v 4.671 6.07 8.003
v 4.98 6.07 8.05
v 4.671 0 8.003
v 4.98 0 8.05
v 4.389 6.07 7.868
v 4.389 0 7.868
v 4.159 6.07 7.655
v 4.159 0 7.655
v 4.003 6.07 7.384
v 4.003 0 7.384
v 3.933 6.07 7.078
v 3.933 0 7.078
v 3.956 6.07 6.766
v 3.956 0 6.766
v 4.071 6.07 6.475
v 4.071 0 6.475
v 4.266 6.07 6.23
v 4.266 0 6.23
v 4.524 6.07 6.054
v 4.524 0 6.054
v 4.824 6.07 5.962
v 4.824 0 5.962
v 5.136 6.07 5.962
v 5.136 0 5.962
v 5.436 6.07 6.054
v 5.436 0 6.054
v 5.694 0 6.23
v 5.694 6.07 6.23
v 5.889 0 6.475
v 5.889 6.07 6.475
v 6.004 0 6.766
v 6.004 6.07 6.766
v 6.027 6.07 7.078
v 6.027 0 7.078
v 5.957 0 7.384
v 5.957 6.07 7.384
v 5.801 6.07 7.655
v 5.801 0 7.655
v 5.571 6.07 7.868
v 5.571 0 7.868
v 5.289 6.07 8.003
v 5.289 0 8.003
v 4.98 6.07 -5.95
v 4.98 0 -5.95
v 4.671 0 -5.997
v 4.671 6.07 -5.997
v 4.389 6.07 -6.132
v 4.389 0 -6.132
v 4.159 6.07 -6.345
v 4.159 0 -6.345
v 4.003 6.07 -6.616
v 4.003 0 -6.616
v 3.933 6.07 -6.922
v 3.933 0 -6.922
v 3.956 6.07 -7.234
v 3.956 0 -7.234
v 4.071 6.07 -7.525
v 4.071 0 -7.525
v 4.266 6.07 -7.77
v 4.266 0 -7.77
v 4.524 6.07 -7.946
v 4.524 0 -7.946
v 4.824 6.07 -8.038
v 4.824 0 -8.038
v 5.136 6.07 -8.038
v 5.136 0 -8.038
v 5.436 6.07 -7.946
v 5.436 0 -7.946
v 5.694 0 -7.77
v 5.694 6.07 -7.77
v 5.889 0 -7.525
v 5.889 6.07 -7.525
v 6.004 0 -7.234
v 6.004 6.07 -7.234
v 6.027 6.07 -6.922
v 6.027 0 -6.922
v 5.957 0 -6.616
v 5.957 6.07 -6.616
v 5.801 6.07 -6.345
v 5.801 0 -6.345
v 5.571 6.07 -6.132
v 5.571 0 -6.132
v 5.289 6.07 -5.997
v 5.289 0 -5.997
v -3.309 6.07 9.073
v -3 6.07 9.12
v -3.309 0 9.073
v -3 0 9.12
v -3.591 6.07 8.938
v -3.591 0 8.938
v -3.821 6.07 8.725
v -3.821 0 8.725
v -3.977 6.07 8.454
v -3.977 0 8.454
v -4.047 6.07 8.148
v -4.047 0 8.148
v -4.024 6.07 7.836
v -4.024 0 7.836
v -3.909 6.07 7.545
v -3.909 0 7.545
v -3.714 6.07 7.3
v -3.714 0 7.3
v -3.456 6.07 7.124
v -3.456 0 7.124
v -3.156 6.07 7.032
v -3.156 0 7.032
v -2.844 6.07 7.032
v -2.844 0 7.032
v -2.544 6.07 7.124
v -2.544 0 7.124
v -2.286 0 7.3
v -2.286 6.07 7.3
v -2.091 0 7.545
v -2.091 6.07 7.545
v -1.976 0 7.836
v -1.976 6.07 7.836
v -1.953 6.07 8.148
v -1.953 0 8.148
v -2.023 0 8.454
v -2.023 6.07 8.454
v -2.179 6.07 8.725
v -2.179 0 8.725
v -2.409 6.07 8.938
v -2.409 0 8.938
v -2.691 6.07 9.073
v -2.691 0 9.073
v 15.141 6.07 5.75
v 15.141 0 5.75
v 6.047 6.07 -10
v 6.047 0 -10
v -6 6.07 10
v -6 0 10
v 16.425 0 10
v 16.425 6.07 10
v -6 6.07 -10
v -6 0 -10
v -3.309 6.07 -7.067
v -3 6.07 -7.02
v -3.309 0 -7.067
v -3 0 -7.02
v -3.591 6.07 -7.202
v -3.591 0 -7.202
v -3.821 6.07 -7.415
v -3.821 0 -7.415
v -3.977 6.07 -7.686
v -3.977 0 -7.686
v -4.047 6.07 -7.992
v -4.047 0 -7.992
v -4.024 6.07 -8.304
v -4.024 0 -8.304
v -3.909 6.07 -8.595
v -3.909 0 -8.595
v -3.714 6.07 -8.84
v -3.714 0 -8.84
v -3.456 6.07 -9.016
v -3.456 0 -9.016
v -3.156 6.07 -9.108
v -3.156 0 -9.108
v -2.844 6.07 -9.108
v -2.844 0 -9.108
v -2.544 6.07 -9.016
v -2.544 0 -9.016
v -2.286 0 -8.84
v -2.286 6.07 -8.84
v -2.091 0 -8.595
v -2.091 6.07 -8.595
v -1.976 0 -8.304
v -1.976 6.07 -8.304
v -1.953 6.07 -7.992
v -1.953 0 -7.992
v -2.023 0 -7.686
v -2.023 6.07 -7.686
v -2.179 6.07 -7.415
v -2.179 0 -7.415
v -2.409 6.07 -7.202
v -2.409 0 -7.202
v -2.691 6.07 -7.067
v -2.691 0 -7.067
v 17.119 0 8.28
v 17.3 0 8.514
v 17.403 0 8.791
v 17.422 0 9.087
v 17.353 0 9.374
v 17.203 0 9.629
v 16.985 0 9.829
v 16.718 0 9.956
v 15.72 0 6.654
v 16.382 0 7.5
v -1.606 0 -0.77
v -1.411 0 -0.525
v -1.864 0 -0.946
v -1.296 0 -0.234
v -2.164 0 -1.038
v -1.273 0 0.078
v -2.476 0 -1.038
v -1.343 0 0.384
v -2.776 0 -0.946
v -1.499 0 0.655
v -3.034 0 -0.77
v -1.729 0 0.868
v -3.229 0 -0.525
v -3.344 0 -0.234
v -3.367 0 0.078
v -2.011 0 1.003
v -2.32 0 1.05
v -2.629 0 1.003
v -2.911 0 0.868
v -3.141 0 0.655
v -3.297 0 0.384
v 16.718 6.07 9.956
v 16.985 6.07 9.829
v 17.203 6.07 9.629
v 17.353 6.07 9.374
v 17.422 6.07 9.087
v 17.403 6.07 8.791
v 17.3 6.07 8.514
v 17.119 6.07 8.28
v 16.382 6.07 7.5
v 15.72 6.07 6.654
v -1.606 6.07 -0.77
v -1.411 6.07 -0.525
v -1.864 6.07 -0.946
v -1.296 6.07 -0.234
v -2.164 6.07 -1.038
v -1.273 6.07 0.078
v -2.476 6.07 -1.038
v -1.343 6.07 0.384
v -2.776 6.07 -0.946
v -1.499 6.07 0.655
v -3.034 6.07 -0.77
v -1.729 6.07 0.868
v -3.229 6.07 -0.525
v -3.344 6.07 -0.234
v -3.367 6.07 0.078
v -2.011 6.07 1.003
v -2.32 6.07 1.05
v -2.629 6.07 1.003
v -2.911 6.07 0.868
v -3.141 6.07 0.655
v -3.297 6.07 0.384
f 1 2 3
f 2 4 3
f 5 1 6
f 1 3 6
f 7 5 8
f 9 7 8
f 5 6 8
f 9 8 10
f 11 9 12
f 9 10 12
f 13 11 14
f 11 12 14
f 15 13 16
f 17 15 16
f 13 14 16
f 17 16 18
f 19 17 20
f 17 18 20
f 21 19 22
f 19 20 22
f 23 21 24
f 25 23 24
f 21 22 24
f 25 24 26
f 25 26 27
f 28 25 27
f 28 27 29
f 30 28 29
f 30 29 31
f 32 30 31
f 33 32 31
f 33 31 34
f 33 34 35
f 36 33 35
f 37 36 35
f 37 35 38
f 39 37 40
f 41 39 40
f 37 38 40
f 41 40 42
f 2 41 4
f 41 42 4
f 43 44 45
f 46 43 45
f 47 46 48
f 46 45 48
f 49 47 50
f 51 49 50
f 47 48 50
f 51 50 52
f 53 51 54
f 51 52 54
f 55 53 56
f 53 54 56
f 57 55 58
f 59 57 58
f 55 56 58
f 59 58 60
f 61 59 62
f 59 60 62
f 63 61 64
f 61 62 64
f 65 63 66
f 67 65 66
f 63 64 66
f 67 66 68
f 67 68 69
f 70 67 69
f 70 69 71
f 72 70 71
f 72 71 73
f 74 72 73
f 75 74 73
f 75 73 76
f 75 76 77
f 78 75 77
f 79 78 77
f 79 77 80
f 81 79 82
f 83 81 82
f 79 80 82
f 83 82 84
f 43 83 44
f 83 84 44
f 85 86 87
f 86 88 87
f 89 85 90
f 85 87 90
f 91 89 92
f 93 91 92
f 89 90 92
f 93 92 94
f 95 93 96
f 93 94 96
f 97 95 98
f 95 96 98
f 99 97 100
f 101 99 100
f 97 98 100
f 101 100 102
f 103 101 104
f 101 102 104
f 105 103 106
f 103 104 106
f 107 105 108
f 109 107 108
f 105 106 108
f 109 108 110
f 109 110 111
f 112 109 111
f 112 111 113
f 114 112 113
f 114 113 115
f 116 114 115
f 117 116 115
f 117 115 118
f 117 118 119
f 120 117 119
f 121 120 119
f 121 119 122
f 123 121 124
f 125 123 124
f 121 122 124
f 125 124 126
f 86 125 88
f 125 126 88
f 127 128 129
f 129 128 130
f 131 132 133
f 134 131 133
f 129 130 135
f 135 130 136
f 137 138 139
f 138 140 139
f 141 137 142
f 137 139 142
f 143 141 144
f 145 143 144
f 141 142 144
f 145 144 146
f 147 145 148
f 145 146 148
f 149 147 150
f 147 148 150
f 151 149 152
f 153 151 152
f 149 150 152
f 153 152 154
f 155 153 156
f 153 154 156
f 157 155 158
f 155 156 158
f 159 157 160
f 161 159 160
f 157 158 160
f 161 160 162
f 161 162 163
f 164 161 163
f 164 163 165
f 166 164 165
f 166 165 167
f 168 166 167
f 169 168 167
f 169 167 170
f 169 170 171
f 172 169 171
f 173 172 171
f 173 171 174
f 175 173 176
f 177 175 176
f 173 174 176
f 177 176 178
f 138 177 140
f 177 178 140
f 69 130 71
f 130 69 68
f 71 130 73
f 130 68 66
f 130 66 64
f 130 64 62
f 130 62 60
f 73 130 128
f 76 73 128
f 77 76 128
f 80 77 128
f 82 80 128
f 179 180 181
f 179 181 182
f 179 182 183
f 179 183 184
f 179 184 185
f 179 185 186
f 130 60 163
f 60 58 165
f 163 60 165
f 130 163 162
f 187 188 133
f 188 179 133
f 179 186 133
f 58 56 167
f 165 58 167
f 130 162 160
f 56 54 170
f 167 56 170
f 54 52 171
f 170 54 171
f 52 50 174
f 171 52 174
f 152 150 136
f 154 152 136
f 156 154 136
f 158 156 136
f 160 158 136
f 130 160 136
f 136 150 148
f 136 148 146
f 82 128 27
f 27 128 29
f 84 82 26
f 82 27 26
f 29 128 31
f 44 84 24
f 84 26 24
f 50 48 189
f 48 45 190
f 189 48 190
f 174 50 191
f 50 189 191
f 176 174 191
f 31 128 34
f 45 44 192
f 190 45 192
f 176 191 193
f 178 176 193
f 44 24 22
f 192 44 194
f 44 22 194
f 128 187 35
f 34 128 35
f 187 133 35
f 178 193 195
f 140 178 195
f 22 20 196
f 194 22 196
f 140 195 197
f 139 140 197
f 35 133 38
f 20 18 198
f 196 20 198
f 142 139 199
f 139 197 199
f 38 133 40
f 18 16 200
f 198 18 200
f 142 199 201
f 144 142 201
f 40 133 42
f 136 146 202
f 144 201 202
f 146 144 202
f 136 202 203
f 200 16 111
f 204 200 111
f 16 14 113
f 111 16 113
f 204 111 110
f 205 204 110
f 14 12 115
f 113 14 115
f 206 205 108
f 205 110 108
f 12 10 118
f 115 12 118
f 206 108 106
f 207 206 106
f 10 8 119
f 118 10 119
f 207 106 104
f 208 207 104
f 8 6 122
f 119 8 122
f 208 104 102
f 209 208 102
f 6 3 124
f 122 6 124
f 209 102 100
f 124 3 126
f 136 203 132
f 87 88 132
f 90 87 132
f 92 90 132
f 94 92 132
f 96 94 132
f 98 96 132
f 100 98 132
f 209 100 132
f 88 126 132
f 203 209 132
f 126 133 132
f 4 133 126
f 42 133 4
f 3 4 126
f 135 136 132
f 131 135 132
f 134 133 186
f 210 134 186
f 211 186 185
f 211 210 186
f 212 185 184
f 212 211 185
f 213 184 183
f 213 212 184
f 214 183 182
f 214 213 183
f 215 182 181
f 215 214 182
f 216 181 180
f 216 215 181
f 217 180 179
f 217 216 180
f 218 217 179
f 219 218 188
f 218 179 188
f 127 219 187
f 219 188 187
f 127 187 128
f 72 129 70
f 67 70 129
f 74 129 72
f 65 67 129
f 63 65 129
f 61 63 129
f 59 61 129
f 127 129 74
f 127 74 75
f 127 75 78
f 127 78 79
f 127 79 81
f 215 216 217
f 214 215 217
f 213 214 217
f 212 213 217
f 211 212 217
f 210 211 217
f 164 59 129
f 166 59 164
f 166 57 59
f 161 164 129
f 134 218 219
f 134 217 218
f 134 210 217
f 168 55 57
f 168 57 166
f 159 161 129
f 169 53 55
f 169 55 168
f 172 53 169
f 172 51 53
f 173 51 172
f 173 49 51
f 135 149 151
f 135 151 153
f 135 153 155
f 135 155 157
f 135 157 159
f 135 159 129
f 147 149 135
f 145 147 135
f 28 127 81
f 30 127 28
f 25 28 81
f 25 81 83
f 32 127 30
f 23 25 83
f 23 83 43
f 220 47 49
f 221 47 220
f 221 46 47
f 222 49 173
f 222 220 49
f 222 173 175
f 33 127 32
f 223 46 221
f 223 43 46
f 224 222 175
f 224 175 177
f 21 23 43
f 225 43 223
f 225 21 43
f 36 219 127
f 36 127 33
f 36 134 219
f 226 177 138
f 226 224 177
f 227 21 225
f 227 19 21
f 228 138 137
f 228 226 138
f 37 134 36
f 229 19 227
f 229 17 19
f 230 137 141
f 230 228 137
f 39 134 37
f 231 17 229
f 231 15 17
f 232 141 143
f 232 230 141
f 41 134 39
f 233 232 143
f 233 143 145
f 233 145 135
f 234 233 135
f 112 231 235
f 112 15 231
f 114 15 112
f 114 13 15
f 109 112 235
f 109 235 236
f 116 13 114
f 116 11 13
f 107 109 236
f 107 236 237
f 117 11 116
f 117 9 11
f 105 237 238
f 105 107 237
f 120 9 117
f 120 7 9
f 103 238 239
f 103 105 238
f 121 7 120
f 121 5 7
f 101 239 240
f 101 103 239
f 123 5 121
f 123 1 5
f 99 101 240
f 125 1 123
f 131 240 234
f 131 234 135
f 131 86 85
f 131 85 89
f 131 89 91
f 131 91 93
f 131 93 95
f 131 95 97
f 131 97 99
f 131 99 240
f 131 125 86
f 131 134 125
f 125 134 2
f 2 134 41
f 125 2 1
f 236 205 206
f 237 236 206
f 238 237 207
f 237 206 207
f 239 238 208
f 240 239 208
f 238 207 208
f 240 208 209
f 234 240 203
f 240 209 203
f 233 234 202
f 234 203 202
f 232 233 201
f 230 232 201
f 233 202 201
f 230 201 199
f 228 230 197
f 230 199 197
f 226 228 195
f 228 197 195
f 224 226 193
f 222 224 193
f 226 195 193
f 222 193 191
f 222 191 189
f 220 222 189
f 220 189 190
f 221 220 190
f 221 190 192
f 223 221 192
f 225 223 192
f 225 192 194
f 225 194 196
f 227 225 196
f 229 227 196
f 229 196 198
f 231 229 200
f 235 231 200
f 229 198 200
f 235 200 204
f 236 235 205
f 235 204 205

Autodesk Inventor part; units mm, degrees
ref_plane "YZ Plane" through (0, 0, 0) normal (1, 0, 0) x (0, 1, 0)
ref_plane "XZ Plane" through (0, 0, 0) normal (0, 1, 0) x (-1, 0, 0)
ref_plane "XY Plane" through (0, 0, 0) normal (0, 0, 1) x (1, 0, 0)
sketch "Sketch1" plane through (0, 0, 0) normal (0, 1, 0) x (-1, 0, 0)
  line L0 (4, 10) -> (-19.4211, 10)
  line L1 (-19.4211, -10) -> (4, -10)
  line L2 (4, -10) -> (4, 10)
  arc A0 (-19.4211, -10) -> (-19.4211, 10) centre (-25.1, 0) ccw
  line L3 (4, -10) -> (6, -10)
  line L4 (6, -10) -> (6, 10)
  line L5 (6, 10) -> (4, 10)
  line L6 (4, 10) -> (4, -10)
  point P0 (0, 0)
  dimension "d0" = 20
  dimension "d2" = 4
  dimension "d3" = 10
  dimension "d6" = 10
  dimension "d7" = 23
  dimension "d8" = 29.1
  dimension "d11" = 23.4211
  dimension "d12" = 20
  dimension "d13" = 2
extrude "Extrusion1" add sketch "Sketch1" along normal blind 6.07
fillet "Fillet1" radius 1 2 edges at (19.4211, 3.035, 10) (19.4211, 3.035, -10)
sketch "Sketch2" plane through (0, 6.07, 0) normal (0, 1, 0) x (1, 0, 0)
  circle A0 centre (0.68, 0) radius 0.7835 projected
  circle A1 centre (7.98, -7) radius 0.7835 projected
  circle A2 centre (7.98, 7) radius 0.7835 projected
  circle A3 centre (0, -8.07) radius 0.7835 projected
  circle A4 centre (0, 8.07) radius 0.7835 projected
  circle A5 centre (-3, 8.07) radius 1.05
  circle A6 centre (4.98, 7) radius 1.05
  circle A7 centre (-2.32, 0) radius 1.05
  circle A8 centre (4.98, -7) radius 1.05
  circle A9 centre (-3, -8.07) radius 1.05
  point P0 (0, 0)
hole "Hole1" at (4.98, 6.07, 7) at (-2.32, 6.07, 0) at (-3, 6.07, 8.07) at (-3, 6.07, -8.07) at (4.98, 6.07, -7) direction (0, -1, 0) diameter 2.1 depth 7.07
sketch "Sketch3" plane through (0, 0, 0) normal (0, -1, 0) x (1, 0, 0)
  line L0 (18.1137, 10.8993) -> (3.779, -13.929)
  arc A0 (17.1193, 8.28) -> (17.1193, -8.28) centre (25.1, 0) ccw projected
  line L1 (16.4253, -10) -> (-6, -10) projected
  arc A1 (16.4253, -10) -> (17.1193, -8.28) centre (16.4253, -9) ccw projected
  point P0 (0, 0)
  point P1 (15.1407, 5.75)
  point P2 (6.0474, -10)
  dimension "d22" = 60
extrude "Extrusion2" cut sketch "Sketch3" against normal up to next
properties part number "3D_printed_part"
